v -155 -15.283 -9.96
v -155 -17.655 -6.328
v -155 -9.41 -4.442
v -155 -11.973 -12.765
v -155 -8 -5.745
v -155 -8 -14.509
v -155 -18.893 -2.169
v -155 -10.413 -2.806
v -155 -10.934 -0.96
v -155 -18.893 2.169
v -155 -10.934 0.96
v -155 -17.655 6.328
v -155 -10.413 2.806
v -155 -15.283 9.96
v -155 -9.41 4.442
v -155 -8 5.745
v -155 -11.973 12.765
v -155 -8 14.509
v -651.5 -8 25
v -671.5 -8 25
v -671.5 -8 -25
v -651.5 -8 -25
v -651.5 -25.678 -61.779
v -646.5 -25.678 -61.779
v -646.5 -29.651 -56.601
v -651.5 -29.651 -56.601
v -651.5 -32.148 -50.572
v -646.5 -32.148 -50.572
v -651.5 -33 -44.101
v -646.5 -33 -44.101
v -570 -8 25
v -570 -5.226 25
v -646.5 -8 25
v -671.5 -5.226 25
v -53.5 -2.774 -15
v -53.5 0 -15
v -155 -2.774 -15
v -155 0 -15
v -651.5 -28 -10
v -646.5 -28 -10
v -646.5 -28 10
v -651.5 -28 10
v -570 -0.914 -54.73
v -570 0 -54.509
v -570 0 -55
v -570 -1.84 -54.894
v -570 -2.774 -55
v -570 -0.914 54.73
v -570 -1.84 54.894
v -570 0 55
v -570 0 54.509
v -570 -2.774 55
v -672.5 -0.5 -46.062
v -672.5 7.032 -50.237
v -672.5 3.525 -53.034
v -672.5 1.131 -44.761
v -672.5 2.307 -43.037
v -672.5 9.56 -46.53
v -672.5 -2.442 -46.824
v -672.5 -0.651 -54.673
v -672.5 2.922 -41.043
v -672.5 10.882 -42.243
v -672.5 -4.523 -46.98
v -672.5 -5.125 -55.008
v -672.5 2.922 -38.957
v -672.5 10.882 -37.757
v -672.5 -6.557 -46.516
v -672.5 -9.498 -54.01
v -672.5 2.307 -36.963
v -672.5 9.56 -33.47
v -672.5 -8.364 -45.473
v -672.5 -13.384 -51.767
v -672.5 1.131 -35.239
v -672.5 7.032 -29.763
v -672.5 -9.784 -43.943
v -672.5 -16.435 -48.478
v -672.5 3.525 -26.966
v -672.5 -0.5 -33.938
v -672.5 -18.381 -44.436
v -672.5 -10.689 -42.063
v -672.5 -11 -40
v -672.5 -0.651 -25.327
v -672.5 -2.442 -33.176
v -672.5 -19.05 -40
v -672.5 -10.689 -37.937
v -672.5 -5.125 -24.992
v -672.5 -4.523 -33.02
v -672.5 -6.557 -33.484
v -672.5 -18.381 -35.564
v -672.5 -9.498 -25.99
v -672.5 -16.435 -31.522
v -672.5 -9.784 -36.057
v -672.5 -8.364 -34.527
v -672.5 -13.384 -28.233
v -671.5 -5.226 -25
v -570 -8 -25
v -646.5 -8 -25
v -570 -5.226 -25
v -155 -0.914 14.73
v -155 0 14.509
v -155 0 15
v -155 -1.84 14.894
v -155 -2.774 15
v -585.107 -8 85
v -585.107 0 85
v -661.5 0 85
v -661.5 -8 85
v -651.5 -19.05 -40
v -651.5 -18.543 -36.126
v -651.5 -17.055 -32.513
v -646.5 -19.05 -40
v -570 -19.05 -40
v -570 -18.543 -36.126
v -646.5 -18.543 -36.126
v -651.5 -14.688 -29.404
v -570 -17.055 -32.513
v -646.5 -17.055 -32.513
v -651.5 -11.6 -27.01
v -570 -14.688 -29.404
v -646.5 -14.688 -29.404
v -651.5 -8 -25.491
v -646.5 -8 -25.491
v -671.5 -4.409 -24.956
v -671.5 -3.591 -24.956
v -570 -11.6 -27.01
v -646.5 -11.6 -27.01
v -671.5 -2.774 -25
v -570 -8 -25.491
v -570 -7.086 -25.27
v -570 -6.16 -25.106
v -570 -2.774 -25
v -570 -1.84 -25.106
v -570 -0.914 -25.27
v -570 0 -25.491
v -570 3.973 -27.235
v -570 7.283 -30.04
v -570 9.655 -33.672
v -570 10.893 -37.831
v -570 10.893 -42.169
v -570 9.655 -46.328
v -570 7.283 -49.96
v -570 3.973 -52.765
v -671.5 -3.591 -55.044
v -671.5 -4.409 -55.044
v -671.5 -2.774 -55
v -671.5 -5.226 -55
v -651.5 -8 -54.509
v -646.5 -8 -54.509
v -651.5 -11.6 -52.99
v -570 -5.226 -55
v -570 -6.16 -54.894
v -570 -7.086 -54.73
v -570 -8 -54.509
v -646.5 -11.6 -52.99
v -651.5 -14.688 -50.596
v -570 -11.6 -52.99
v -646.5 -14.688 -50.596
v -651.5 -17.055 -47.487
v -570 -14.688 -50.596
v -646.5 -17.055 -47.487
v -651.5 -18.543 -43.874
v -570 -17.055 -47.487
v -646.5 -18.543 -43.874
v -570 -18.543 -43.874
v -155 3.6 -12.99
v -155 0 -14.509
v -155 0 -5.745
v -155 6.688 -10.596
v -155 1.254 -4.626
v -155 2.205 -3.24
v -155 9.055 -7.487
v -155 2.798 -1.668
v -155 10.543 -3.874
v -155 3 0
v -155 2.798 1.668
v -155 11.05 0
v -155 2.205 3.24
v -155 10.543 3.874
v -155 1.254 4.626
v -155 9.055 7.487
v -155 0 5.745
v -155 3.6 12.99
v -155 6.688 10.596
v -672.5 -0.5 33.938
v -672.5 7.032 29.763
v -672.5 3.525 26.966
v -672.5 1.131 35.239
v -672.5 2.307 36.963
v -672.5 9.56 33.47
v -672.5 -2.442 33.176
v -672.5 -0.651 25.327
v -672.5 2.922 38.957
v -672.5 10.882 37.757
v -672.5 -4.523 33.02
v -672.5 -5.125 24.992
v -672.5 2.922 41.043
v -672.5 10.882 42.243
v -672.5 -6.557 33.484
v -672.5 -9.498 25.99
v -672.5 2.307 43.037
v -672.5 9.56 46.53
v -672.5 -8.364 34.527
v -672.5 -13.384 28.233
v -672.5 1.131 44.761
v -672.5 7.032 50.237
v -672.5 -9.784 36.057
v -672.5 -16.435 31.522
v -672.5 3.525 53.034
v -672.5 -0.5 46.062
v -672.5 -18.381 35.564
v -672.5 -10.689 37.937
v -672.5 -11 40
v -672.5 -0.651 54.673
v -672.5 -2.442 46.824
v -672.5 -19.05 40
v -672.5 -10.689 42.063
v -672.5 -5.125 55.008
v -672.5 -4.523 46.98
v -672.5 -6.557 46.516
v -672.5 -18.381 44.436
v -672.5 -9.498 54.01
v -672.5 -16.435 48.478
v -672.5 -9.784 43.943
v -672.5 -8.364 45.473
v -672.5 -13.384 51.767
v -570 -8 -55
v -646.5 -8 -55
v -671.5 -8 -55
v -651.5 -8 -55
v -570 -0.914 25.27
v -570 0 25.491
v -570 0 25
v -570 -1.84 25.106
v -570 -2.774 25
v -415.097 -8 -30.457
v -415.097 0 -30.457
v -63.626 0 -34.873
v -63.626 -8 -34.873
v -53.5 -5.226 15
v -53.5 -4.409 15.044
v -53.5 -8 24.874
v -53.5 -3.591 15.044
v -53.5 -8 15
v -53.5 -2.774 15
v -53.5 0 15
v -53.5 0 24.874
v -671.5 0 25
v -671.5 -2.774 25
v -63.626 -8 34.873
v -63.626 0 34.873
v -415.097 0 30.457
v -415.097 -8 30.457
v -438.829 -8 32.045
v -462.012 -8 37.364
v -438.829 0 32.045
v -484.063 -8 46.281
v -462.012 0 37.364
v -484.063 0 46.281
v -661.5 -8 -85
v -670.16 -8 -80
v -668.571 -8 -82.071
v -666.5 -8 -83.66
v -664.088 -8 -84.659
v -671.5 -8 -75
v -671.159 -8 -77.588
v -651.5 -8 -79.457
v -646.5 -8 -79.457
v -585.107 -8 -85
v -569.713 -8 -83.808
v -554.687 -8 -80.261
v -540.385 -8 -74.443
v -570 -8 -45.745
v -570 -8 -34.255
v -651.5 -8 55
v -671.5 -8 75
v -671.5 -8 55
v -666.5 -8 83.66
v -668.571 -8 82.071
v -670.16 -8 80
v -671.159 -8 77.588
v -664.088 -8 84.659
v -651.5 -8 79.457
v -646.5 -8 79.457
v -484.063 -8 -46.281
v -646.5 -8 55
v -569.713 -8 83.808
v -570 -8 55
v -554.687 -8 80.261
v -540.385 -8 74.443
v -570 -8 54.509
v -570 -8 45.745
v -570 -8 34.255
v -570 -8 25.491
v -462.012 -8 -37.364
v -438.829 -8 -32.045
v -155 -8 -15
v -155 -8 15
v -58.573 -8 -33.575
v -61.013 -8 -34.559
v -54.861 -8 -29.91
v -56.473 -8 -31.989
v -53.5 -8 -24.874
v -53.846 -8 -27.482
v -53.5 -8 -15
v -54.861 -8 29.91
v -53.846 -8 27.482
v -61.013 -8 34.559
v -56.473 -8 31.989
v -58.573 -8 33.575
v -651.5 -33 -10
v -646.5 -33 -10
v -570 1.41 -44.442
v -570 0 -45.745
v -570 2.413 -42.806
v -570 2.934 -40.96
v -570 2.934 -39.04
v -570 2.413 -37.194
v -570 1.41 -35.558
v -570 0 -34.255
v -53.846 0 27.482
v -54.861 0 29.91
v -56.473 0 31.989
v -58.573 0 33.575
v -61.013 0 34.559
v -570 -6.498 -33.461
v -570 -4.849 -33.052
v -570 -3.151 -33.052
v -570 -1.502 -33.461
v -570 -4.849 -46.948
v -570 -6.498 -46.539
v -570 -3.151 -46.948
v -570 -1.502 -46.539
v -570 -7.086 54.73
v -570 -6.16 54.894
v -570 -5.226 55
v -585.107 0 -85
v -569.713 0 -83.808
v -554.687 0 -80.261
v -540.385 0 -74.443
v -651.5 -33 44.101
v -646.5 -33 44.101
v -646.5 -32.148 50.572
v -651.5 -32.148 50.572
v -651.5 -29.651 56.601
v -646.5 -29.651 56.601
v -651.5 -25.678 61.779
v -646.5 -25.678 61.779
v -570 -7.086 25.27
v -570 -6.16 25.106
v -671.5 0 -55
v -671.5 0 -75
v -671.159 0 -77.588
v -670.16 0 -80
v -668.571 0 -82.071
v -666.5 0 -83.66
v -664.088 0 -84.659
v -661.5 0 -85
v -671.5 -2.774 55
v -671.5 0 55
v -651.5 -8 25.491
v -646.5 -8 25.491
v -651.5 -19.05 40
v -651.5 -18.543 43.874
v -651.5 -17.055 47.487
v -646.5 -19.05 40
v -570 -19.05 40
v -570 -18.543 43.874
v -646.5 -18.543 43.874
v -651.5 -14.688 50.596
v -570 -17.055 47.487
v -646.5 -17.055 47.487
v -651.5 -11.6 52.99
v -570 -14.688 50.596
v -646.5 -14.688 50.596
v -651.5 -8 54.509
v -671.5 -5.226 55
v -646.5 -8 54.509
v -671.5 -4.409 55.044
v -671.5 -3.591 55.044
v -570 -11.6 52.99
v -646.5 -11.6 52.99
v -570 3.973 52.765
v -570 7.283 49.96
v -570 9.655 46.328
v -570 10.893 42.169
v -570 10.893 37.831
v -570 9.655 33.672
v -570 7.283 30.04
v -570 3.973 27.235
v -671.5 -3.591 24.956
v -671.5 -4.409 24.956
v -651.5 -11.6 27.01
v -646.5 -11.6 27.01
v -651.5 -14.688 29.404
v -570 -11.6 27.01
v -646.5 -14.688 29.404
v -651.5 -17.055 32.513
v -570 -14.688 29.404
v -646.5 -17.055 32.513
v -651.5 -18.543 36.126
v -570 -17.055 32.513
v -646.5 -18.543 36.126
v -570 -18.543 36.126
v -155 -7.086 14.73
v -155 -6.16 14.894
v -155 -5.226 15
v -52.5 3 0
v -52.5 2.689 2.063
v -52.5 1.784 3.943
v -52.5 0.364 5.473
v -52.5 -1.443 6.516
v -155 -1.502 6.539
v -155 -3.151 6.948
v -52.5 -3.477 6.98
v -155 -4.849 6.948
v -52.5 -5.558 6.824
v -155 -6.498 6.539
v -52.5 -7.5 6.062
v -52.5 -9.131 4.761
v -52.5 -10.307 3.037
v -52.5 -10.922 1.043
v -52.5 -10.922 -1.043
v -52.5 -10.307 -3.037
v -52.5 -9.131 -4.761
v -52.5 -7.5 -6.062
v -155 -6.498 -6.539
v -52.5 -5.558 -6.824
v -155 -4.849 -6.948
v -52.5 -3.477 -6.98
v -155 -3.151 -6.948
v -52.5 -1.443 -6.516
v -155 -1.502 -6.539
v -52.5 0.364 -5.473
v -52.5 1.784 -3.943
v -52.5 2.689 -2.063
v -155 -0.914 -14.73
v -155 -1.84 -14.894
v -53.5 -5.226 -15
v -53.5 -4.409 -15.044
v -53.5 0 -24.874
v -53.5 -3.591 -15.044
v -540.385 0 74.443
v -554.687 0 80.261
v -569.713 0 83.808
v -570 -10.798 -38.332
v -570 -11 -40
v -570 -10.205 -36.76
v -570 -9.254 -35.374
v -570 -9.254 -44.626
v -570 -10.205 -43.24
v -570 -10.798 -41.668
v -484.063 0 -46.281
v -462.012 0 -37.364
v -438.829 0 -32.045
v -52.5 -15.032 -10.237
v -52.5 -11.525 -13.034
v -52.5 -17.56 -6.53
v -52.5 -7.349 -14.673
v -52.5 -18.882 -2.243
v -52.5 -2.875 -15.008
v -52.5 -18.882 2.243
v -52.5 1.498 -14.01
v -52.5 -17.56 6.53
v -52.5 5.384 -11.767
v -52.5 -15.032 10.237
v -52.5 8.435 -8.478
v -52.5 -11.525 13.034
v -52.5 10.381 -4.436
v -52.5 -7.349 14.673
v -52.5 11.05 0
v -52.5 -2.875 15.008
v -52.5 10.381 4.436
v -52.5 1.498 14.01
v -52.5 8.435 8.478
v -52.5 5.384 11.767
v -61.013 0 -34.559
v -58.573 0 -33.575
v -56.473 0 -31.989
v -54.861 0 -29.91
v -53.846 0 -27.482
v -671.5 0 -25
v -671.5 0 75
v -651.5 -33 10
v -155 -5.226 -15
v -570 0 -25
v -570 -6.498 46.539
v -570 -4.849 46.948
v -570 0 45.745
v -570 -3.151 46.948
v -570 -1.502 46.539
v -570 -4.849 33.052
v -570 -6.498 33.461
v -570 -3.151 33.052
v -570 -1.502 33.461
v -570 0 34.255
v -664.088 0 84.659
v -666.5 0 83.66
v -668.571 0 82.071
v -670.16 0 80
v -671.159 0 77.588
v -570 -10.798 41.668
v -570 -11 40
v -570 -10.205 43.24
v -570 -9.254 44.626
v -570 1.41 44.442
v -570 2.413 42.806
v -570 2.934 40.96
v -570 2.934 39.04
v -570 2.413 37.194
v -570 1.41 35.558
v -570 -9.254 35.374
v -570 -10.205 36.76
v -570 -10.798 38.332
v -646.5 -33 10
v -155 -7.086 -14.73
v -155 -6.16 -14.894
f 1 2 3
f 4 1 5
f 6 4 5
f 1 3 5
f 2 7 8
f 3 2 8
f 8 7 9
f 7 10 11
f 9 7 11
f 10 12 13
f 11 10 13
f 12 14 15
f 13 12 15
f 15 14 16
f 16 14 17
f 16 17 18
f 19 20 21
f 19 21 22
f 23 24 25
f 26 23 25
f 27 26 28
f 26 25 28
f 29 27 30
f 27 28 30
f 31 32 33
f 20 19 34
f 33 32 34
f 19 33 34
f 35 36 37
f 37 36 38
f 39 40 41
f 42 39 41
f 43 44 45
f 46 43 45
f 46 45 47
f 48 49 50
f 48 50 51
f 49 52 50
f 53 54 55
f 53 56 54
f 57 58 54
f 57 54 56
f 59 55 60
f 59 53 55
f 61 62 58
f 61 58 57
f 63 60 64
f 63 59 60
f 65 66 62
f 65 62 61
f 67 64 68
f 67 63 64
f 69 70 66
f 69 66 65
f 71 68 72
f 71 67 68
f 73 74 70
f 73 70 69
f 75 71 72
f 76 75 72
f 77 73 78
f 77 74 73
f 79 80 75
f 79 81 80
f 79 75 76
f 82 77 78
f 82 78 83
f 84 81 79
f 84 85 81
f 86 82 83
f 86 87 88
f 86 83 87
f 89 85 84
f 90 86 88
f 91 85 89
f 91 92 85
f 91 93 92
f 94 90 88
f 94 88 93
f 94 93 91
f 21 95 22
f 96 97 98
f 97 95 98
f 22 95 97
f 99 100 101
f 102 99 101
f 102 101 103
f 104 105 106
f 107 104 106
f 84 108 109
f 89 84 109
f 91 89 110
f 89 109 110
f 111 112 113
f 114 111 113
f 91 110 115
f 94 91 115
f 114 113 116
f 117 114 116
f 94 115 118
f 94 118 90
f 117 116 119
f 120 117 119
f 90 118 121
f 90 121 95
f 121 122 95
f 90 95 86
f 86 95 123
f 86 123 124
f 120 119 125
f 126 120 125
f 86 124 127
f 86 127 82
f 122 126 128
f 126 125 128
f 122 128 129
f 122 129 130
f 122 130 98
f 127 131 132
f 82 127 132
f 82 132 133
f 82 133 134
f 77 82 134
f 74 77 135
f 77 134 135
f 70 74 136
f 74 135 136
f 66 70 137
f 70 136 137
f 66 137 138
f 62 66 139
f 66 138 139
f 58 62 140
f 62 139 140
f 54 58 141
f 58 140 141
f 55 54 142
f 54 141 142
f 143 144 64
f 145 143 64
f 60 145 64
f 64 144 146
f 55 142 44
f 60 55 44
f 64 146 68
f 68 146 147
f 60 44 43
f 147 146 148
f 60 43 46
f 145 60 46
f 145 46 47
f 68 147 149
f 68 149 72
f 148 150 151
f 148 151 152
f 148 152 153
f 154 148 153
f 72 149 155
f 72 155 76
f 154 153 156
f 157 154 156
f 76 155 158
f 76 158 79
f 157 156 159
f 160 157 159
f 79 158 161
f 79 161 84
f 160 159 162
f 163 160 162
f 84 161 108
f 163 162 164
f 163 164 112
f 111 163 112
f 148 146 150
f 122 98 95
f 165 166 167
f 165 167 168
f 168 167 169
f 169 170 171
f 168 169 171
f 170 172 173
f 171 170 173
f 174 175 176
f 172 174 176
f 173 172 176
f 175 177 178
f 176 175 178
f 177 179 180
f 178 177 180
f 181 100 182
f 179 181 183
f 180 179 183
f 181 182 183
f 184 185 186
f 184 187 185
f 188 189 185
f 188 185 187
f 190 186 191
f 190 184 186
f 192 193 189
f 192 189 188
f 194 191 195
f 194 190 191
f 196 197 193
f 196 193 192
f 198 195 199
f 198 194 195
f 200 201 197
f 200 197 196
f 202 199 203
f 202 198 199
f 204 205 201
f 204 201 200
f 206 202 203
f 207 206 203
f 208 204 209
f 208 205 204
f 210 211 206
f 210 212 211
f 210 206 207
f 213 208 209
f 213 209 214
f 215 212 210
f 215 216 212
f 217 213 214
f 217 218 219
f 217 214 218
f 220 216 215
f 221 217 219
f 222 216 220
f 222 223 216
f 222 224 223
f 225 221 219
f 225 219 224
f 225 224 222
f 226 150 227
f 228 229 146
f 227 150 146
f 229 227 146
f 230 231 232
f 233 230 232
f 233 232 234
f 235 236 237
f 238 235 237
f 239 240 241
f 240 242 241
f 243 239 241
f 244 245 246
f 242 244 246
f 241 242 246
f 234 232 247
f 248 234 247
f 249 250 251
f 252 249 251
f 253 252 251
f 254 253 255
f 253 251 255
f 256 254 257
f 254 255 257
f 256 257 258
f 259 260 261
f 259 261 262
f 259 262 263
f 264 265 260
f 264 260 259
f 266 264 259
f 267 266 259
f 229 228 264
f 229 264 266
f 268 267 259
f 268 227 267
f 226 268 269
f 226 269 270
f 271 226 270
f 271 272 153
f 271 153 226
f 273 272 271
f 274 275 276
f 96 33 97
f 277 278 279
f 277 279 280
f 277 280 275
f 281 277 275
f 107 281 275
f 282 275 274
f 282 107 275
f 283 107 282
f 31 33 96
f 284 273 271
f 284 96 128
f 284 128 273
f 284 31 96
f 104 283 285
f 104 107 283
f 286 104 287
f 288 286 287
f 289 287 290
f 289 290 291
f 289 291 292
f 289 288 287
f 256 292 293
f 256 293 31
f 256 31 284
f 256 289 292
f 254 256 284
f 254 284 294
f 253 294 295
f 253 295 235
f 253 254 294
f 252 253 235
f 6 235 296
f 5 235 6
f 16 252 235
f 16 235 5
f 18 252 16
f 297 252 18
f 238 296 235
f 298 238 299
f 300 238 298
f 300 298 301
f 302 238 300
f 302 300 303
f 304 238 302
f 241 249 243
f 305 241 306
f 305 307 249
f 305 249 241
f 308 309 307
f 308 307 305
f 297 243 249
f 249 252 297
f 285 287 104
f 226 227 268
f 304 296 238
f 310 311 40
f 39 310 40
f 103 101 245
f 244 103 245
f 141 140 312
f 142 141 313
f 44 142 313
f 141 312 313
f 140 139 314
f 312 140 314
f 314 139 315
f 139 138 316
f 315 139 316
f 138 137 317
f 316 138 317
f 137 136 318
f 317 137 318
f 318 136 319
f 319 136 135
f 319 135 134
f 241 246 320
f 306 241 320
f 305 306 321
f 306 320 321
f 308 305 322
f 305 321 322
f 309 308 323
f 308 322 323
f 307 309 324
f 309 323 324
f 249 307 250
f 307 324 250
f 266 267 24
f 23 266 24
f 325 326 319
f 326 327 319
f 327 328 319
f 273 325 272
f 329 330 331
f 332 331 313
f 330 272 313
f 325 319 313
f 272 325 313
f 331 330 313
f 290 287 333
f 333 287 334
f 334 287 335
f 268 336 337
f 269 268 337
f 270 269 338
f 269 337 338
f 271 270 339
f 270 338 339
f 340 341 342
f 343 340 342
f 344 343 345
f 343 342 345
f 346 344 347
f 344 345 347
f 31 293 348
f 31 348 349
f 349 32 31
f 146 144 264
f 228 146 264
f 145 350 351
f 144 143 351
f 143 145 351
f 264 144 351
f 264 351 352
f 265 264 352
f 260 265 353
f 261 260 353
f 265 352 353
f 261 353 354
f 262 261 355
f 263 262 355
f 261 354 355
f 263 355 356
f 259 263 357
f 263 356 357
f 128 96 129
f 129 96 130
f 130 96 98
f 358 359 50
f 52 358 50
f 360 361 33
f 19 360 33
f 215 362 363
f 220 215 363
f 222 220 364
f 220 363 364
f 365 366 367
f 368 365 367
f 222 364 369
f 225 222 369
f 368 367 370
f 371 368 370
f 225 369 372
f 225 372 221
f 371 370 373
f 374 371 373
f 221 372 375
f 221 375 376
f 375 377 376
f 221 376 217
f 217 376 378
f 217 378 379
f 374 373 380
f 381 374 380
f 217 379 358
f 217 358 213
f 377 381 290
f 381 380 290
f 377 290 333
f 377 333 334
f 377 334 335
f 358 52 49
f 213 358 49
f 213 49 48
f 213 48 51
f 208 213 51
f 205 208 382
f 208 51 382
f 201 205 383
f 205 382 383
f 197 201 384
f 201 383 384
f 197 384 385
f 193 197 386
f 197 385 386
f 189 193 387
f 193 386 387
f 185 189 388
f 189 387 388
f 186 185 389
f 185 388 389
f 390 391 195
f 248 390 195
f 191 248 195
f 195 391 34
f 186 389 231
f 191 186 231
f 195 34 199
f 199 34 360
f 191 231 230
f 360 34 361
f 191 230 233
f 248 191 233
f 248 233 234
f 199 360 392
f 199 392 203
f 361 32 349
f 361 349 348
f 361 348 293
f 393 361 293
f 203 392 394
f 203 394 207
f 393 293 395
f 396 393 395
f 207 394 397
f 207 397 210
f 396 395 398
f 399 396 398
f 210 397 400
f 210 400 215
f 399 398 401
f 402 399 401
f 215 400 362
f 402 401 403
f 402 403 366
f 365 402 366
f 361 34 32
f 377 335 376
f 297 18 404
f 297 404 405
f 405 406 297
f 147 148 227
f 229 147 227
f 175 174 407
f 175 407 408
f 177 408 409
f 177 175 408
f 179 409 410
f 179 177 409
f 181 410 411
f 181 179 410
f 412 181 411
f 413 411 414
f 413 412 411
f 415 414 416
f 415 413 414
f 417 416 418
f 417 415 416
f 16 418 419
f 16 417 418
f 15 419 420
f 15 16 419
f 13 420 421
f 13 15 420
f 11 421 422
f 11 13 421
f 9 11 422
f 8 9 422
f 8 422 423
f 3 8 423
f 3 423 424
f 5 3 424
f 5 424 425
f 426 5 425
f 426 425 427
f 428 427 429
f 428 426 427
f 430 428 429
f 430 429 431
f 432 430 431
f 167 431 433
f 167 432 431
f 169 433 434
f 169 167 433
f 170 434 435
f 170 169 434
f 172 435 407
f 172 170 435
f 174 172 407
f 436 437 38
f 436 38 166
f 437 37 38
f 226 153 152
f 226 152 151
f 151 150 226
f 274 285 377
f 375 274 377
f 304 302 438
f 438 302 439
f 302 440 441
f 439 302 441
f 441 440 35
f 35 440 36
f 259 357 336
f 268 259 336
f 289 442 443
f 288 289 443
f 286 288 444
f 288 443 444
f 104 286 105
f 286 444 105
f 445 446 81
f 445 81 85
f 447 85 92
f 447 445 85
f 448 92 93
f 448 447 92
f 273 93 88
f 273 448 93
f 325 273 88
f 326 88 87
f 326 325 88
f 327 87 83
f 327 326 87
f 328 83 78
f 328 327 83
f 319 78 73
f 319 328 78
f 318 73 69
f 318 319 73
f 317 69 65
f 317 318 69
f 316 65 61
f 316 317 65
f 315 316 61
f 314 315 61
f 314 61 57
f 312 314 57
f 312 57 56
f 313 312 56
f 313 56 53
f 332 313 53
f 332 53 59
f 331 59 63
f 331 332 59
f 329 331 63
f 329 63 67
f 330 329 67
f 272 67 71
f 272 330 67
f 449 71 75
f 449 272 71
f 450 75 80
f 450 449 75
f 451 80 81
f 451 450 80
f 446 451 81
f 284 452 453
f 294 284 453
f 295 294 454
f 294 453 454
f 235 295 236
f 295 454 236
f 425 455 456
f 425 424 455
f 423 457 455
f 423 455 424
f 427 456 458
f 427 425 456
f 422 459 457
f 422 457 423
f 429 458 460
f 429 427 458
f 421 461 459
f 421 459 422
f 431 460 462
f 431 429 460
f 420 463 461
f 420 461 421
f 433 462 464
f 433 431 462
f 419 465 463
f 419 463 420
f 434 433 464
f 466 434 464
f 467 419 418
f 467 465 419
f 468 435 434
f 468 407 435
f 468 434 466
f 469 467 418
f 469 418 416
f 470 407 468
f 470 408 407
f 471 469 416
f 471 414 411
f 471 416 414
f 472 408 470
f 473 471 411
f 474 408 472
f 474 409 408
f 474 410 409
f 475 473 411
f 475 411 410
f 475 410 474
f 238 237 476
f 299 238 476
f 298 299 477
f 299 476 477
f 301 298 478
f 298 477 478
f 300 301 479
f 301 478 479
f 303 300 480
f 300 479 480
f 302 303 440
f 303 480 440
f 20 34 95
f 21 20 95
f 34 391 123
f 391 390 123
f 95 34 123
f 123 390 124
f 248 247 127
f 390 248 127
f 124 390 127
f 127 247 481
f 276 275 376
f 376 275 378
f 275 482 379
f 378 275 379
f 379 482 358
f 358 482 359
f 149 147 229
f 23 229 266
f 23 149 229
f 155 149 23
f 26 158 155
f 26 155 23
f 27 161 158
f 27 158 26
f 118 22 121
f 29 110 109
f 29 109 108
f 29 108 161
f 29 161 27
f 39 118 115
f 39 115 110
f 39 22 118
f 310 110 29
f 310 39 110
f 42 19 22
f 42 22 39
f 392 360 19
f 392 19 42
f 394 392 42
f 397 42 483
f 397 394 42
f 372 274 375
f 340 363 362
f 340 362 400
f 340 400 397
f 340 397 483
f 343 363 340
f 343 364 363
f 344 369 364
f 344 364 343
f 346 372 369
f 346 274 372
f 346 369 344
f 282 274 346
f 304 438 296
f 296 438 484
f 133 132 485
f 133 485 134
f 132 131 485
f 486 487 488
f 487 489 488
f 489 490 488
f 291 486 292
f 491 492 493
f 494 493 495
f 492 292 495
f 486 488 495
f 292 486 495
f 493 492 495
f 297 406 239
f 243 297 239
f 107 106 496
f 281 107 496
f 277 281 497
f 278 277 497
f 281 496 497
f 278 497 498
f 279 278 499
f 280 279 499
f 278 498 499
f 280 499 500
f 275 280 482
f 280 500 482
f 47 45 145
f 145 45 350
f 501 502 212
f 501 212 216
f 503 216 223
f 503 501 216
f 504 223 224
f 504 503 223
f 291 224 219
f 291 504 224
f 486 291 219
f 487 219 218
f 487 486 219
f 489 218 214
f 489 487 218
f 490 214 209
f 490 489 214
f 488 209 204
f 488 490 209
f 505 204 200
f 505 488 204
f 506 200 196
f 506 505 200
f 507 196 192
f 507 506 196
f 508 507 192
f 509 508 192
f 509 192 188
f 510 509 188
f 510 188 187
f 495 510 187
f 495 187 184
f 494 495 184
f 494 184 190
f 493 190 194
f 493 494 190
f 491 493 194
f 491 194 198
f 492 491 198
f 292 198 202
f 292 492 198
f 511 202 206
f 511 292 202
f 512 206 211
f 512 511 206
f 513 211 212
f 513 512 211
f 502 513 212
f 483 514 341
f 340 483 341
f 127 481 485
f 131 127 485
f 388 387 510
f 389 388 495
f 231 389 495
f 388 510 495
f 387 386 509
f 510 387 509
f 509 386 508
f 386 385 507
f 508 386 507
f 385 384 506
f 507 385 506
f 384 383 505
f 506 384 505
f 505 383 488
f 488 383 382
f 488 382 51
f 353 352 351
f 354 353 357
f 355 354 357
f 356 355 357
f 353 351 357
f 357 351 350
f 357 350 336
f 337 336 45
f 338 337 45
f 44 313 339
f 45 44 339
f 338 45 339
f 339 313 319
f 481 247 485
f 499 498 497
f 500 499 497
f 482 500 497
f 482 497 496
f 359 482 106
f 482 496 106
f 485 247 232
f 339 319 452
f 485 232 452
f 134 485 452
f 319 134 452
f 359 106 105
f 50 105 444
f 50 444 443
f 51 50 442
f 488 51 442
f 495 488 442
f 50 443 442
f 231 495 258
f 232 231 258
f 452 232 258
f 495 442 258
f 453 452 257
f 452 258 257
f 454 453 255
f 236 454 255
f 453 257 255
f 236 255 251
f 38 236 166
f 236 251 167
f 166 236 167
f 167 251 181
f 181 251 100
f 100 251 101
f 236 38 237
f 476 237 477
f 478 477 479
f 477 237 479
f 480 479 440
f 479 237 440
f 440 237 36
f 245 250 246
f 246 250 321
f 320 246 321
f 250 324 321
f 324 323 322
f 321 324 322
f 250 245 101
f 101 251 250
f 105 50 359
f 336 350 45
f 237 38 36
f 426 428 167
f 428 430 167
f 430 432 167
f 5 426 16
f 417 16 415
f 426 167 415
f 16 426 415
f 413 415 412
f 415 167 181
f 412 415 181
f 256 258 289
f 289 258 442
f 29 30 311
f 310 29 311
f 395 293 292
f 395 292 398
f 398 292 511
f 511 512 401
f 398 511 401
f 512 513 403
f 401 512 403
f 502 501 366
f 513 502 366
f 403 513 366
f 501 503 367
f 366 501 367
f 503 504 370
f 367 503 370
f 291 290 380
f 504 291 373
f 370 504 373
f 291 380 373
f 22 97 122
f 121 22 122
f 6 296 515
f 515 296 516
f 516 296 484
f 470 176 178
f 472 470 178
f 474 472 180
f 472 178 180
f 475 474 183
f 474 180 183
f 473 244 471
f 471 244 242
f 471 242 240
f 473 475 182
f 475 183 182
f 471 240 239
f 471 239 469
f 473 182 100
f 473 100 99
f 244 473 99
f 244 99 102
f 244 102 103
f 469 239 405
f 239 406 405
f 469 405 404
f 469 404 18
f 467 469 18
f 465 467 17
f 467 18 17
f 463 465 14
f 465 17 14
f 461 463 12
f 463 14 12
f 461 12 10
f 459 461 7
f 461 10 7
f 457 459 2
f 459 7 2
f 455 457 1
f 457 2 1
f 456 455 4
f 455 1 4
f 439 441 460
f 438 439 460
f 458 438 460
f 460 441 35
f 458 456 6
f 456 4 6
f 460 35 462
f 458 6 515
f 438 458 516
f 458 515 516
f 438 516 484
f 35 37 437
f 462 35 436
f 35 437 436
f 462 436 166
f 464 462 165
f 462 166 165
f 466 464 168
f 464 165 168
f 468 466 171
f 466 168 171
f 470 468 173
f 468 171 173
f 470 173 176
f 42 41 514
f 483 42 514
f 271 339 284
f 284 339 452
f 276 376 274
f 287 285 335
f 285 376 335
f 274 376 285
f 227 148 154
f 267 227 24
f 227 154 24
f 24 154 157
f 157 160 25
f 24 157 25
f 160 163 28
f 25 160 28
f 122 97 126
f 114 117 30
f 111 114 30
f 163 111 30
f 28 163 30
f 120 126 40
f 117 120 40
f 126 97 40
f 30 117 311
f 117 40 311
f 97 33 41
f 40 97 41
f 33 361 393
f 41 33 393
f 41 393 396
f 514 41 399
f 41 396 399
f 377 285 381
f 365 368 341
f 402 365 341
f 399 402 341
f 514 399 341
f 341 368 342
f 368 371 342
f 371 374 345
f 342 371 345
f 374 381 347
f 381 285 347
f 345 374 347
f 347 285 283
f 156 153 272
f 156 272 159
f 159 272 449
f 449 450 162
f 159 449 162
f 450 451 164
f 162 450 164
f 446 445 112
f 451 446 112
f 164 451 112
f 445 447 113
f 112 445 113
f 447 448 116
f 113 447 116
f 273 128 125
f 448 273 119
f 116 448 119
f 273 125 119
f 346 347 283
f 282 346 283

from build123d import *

# Parameters (mm, degrees)
F2_DEPTH = 8
F3_R     = 15.05
F3_R_2   = 7
F4_DEPTH = 102.5
F5_R     = 15.05
F5_R_2   = 7
F6_DEPTH = 102.5
F9_DEPTH = 5


with BuildPart() as f2:
    # F1 (on Front) → F2 (new body)
    with BuildSketch(Plane.XZ):
        with BuildLine():
            Line((-155, 15), (-53.5, 15))
            Line((-53.5, 15), (-53.5, 24.8735827689))
            ThreePointArc((-53.5, 24.8735827689), (-56.4734852979, 31.9889247243), (-63.6256182283, 34.8727937409))
            Line((-63.6256182283, 34.8727937409), (-415.0965194239, 30.457330158))
            ThreePointArc((-415.0965194239, 30.457330158), (-450.5260994272, 34.2445631167), (-484.0628321732, 46.2814160866))
            Line((-484.0628321732, 46.2814160866), (-540.3854382, 74.4427191))
            ThreePointArc((-540.3854382, 74.4427191), (-562.1315056952, 82.3248989468), (-585.10679775, 85))
            Line((-585.10679775, 85), (-661.5, 85))
            ThreePointArc((-661.5, 85), (-668.5710678119, 82.0710678119), (-671.5, 75))
            Line((-671.5, 75), (-671.5, 55))
            Line((-671.5, 55), (-570, 55))
            Line((-570, 55), (-570, 25))
            Line((-570, 25), (-671.5, 25))
            Line((-671.5, 25), (-671.5, -25))
            Line((-671.5, -25), (-570, -25))
            Line((-570, -25), (-570, -55))
            Line((-570, -55), (-671.5, -55))
            Line((-671.5, -55), (-671.5, -75))
            ThreePointArc((-671.5, -75), (-668.5710678119, -82.0710678119), (-661.5, -85))
            Line((-661.5, -85), (-585.10679775, -85))
            ThreePointArc((-585.10679775, -85), (-562.1315056952, -82.3248989468), (-540.3854382, -74.4427191))
            Line((-540.3854382, -74.4427191), (-484.0628321732, -46.2814160866))
            ThreePointArc((-484.0628321732, -46.2814160866), (-450.5260994272, -34.2445631167), (-415.0965194239, -30.457330158))
            Line((-415.0965194239, -30.457330158), (-63.6256182283, -34.8727937409))
            ThreePointArc((-63.6256182283, -34.8727937409), (-56.4734852979, -31.9889247243), (-53.5, -24.8735827689))
            Line((-53.5, -24.8735827689), (-53.5, -15))
            Line((-53.5, -15), (-155, -15))
            Line((-155, -15), (-155, 15))
        make_face()
    extrude(amount=F2_DEPTH)

    # F3 (on face) → F4 (join)
    with BuildSketch(Plane.YZ.offset(-155)):
        with Locations((-4, 0)):
            Circle(F3_R)
        with Locations((-4, 0)):
            Circle(F3_R_2, mode=Mode.SUBTRACT)
    extrude(amount=F4_DEPTH)

    # F5 (on face) → F6 (join)
    with BuildSketch(Plane(origin=(-570, 0, 0), x_dir=(0, -1, 0), z_dir=(-1, 0, 0))):
        with Locations((4, 40)):
            Circle(F5_R)
        with Locations((4, 40)):
            Circle(F5_R_2, mode=Mode.SUBTRACT)
        with Locations((4, -40)):
            Circle(F5_R)
        with Locations((4, -40)):
            Circle(F5_R_2, mode=Mode.SUBTRACT)
    extrude(amount=F6_DEPTH)

    # F8 (on offset) → F9 (join)
    with BuildSketch(Plane(origin=(-646.5, 0, 0), x_dir=(0, -1, 0), z_dir=(-1, 0, 0))):
        with BuildLine():
            Line((25.6776695297, 61.7791627651), (8, 79.4568322948))
            Line((8, 79.4568322948), (8, 54.4568322948))
            ThreePointArc((8, 54.4568322948), (19, 40), (8, 25.5431677052))
            Line((8, 25.5431677052), (8, -25.5431677052))
            ThreePointArc((8, -25.5431677052), (19, -40), (8, -54.4568322948))
            Line((8, -54.4568322948), (8, -79.4568322948))
            Line((8, -79.4568322948), (25.6776695297, -61.7791627651))
            ThreePointArc((25.6776695297, -61.7791627651), (31.0969883128, -53.6685790446), (33, -44.1014932355))
            Line((33, -44.1014932355), (33, -10))
            Line((33, -10), (28, -10))
            Line((28, -10), (28, 10))
            Line((28, 10), (33, 10))
            Line((33, 10), (33, 44.1014932355))
            ThreePointArc((33, 44.1014932355), (31.0969883128, 53.6685790446), (25.6776695297, 61.7791627651))
        make_face()
    extrude(amount=F9_DEPTH)


solid = f2.part
